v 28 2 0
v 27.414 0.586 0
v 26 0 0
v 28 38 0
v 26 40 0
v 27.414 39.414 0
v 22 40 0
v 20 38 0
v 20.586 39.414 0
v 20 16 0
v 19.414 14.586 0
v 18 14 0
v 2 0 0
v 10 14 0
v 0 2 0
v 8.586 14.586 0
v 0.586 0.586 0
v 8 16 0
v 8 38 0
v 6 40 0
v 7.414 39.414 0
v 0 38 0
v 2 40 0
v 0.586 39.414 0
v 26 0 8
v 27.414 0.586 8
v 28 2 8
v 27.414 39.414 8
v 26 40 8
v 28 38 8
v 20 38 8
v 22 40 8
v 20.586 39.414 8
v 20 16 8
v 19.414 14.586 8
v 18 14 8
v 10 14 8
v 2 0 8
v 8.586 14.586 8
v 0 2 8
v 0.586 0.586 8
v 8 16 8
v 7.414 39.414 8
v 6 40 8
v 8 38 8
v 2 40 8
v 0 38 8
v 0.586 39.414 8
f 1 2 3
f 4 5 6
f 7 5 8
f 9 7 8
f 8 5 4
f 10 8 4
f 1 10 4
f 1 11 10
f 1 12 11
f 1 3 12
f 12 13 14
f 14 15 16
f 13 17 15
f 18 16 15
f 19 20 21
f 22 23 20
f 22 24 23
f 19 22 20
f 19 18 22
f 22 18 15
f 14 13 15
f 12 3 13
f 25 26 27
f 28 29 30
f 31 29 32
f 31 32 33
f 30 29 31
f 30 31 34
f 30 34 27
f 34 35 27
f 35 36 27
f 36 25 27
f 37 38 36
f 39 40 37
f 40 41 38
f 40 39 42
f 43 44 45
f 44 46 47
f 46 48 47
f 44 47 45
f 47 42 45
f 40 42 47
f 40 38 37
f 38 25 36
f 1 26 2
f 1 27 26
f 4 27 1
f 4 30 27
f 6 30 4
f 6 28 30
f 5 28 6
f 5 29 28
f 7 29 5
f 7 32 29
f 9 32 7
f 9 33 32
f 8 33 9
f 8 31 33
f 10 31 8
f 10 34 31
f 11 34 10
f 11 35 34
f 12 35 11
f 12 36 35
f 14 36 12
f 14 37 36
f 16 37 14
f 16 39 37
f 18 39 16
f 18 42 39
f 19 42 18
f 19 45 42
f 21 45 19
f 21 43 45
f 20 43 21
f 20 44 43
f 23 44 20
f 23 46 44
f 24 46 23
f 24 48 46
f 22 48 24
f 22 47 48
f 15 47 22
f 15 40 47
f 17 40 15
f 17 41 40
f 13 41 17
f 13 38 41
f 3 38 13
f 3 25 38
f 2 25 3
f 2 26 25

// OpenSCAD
$fn = 32;

// ----------------------------------------------------------------------
// Eye lug: clevis, 8 mm thick
// ----------------------------------------------------------------------

// --- parameters (mm) ---
profile_height = 8;       // extrusion height
profile_points = 24;      // points of the closed outline

profile = [[0, 2], [0.586, 0.586], [2, 0], [26, 0], [27.414, 0.586], [28, 2], [28, 38], [27.414, 39.414], [26, 40], [22, 40], [20.586, 39.414], [20, 38], [20, 16], [19.414, 14.586], [18, 14], [10, 14], [8.586, 14.586], [8, 16], [8, 38], [7.414, 39.414], [6, 40], [2, 40], [0.586, 39.414], [0, 38]];  // single closed polygon, 24 points, counter clockwise

// --- the one profile operation ---
linear_extrude(height = profile_height) polygon(points = profile);
